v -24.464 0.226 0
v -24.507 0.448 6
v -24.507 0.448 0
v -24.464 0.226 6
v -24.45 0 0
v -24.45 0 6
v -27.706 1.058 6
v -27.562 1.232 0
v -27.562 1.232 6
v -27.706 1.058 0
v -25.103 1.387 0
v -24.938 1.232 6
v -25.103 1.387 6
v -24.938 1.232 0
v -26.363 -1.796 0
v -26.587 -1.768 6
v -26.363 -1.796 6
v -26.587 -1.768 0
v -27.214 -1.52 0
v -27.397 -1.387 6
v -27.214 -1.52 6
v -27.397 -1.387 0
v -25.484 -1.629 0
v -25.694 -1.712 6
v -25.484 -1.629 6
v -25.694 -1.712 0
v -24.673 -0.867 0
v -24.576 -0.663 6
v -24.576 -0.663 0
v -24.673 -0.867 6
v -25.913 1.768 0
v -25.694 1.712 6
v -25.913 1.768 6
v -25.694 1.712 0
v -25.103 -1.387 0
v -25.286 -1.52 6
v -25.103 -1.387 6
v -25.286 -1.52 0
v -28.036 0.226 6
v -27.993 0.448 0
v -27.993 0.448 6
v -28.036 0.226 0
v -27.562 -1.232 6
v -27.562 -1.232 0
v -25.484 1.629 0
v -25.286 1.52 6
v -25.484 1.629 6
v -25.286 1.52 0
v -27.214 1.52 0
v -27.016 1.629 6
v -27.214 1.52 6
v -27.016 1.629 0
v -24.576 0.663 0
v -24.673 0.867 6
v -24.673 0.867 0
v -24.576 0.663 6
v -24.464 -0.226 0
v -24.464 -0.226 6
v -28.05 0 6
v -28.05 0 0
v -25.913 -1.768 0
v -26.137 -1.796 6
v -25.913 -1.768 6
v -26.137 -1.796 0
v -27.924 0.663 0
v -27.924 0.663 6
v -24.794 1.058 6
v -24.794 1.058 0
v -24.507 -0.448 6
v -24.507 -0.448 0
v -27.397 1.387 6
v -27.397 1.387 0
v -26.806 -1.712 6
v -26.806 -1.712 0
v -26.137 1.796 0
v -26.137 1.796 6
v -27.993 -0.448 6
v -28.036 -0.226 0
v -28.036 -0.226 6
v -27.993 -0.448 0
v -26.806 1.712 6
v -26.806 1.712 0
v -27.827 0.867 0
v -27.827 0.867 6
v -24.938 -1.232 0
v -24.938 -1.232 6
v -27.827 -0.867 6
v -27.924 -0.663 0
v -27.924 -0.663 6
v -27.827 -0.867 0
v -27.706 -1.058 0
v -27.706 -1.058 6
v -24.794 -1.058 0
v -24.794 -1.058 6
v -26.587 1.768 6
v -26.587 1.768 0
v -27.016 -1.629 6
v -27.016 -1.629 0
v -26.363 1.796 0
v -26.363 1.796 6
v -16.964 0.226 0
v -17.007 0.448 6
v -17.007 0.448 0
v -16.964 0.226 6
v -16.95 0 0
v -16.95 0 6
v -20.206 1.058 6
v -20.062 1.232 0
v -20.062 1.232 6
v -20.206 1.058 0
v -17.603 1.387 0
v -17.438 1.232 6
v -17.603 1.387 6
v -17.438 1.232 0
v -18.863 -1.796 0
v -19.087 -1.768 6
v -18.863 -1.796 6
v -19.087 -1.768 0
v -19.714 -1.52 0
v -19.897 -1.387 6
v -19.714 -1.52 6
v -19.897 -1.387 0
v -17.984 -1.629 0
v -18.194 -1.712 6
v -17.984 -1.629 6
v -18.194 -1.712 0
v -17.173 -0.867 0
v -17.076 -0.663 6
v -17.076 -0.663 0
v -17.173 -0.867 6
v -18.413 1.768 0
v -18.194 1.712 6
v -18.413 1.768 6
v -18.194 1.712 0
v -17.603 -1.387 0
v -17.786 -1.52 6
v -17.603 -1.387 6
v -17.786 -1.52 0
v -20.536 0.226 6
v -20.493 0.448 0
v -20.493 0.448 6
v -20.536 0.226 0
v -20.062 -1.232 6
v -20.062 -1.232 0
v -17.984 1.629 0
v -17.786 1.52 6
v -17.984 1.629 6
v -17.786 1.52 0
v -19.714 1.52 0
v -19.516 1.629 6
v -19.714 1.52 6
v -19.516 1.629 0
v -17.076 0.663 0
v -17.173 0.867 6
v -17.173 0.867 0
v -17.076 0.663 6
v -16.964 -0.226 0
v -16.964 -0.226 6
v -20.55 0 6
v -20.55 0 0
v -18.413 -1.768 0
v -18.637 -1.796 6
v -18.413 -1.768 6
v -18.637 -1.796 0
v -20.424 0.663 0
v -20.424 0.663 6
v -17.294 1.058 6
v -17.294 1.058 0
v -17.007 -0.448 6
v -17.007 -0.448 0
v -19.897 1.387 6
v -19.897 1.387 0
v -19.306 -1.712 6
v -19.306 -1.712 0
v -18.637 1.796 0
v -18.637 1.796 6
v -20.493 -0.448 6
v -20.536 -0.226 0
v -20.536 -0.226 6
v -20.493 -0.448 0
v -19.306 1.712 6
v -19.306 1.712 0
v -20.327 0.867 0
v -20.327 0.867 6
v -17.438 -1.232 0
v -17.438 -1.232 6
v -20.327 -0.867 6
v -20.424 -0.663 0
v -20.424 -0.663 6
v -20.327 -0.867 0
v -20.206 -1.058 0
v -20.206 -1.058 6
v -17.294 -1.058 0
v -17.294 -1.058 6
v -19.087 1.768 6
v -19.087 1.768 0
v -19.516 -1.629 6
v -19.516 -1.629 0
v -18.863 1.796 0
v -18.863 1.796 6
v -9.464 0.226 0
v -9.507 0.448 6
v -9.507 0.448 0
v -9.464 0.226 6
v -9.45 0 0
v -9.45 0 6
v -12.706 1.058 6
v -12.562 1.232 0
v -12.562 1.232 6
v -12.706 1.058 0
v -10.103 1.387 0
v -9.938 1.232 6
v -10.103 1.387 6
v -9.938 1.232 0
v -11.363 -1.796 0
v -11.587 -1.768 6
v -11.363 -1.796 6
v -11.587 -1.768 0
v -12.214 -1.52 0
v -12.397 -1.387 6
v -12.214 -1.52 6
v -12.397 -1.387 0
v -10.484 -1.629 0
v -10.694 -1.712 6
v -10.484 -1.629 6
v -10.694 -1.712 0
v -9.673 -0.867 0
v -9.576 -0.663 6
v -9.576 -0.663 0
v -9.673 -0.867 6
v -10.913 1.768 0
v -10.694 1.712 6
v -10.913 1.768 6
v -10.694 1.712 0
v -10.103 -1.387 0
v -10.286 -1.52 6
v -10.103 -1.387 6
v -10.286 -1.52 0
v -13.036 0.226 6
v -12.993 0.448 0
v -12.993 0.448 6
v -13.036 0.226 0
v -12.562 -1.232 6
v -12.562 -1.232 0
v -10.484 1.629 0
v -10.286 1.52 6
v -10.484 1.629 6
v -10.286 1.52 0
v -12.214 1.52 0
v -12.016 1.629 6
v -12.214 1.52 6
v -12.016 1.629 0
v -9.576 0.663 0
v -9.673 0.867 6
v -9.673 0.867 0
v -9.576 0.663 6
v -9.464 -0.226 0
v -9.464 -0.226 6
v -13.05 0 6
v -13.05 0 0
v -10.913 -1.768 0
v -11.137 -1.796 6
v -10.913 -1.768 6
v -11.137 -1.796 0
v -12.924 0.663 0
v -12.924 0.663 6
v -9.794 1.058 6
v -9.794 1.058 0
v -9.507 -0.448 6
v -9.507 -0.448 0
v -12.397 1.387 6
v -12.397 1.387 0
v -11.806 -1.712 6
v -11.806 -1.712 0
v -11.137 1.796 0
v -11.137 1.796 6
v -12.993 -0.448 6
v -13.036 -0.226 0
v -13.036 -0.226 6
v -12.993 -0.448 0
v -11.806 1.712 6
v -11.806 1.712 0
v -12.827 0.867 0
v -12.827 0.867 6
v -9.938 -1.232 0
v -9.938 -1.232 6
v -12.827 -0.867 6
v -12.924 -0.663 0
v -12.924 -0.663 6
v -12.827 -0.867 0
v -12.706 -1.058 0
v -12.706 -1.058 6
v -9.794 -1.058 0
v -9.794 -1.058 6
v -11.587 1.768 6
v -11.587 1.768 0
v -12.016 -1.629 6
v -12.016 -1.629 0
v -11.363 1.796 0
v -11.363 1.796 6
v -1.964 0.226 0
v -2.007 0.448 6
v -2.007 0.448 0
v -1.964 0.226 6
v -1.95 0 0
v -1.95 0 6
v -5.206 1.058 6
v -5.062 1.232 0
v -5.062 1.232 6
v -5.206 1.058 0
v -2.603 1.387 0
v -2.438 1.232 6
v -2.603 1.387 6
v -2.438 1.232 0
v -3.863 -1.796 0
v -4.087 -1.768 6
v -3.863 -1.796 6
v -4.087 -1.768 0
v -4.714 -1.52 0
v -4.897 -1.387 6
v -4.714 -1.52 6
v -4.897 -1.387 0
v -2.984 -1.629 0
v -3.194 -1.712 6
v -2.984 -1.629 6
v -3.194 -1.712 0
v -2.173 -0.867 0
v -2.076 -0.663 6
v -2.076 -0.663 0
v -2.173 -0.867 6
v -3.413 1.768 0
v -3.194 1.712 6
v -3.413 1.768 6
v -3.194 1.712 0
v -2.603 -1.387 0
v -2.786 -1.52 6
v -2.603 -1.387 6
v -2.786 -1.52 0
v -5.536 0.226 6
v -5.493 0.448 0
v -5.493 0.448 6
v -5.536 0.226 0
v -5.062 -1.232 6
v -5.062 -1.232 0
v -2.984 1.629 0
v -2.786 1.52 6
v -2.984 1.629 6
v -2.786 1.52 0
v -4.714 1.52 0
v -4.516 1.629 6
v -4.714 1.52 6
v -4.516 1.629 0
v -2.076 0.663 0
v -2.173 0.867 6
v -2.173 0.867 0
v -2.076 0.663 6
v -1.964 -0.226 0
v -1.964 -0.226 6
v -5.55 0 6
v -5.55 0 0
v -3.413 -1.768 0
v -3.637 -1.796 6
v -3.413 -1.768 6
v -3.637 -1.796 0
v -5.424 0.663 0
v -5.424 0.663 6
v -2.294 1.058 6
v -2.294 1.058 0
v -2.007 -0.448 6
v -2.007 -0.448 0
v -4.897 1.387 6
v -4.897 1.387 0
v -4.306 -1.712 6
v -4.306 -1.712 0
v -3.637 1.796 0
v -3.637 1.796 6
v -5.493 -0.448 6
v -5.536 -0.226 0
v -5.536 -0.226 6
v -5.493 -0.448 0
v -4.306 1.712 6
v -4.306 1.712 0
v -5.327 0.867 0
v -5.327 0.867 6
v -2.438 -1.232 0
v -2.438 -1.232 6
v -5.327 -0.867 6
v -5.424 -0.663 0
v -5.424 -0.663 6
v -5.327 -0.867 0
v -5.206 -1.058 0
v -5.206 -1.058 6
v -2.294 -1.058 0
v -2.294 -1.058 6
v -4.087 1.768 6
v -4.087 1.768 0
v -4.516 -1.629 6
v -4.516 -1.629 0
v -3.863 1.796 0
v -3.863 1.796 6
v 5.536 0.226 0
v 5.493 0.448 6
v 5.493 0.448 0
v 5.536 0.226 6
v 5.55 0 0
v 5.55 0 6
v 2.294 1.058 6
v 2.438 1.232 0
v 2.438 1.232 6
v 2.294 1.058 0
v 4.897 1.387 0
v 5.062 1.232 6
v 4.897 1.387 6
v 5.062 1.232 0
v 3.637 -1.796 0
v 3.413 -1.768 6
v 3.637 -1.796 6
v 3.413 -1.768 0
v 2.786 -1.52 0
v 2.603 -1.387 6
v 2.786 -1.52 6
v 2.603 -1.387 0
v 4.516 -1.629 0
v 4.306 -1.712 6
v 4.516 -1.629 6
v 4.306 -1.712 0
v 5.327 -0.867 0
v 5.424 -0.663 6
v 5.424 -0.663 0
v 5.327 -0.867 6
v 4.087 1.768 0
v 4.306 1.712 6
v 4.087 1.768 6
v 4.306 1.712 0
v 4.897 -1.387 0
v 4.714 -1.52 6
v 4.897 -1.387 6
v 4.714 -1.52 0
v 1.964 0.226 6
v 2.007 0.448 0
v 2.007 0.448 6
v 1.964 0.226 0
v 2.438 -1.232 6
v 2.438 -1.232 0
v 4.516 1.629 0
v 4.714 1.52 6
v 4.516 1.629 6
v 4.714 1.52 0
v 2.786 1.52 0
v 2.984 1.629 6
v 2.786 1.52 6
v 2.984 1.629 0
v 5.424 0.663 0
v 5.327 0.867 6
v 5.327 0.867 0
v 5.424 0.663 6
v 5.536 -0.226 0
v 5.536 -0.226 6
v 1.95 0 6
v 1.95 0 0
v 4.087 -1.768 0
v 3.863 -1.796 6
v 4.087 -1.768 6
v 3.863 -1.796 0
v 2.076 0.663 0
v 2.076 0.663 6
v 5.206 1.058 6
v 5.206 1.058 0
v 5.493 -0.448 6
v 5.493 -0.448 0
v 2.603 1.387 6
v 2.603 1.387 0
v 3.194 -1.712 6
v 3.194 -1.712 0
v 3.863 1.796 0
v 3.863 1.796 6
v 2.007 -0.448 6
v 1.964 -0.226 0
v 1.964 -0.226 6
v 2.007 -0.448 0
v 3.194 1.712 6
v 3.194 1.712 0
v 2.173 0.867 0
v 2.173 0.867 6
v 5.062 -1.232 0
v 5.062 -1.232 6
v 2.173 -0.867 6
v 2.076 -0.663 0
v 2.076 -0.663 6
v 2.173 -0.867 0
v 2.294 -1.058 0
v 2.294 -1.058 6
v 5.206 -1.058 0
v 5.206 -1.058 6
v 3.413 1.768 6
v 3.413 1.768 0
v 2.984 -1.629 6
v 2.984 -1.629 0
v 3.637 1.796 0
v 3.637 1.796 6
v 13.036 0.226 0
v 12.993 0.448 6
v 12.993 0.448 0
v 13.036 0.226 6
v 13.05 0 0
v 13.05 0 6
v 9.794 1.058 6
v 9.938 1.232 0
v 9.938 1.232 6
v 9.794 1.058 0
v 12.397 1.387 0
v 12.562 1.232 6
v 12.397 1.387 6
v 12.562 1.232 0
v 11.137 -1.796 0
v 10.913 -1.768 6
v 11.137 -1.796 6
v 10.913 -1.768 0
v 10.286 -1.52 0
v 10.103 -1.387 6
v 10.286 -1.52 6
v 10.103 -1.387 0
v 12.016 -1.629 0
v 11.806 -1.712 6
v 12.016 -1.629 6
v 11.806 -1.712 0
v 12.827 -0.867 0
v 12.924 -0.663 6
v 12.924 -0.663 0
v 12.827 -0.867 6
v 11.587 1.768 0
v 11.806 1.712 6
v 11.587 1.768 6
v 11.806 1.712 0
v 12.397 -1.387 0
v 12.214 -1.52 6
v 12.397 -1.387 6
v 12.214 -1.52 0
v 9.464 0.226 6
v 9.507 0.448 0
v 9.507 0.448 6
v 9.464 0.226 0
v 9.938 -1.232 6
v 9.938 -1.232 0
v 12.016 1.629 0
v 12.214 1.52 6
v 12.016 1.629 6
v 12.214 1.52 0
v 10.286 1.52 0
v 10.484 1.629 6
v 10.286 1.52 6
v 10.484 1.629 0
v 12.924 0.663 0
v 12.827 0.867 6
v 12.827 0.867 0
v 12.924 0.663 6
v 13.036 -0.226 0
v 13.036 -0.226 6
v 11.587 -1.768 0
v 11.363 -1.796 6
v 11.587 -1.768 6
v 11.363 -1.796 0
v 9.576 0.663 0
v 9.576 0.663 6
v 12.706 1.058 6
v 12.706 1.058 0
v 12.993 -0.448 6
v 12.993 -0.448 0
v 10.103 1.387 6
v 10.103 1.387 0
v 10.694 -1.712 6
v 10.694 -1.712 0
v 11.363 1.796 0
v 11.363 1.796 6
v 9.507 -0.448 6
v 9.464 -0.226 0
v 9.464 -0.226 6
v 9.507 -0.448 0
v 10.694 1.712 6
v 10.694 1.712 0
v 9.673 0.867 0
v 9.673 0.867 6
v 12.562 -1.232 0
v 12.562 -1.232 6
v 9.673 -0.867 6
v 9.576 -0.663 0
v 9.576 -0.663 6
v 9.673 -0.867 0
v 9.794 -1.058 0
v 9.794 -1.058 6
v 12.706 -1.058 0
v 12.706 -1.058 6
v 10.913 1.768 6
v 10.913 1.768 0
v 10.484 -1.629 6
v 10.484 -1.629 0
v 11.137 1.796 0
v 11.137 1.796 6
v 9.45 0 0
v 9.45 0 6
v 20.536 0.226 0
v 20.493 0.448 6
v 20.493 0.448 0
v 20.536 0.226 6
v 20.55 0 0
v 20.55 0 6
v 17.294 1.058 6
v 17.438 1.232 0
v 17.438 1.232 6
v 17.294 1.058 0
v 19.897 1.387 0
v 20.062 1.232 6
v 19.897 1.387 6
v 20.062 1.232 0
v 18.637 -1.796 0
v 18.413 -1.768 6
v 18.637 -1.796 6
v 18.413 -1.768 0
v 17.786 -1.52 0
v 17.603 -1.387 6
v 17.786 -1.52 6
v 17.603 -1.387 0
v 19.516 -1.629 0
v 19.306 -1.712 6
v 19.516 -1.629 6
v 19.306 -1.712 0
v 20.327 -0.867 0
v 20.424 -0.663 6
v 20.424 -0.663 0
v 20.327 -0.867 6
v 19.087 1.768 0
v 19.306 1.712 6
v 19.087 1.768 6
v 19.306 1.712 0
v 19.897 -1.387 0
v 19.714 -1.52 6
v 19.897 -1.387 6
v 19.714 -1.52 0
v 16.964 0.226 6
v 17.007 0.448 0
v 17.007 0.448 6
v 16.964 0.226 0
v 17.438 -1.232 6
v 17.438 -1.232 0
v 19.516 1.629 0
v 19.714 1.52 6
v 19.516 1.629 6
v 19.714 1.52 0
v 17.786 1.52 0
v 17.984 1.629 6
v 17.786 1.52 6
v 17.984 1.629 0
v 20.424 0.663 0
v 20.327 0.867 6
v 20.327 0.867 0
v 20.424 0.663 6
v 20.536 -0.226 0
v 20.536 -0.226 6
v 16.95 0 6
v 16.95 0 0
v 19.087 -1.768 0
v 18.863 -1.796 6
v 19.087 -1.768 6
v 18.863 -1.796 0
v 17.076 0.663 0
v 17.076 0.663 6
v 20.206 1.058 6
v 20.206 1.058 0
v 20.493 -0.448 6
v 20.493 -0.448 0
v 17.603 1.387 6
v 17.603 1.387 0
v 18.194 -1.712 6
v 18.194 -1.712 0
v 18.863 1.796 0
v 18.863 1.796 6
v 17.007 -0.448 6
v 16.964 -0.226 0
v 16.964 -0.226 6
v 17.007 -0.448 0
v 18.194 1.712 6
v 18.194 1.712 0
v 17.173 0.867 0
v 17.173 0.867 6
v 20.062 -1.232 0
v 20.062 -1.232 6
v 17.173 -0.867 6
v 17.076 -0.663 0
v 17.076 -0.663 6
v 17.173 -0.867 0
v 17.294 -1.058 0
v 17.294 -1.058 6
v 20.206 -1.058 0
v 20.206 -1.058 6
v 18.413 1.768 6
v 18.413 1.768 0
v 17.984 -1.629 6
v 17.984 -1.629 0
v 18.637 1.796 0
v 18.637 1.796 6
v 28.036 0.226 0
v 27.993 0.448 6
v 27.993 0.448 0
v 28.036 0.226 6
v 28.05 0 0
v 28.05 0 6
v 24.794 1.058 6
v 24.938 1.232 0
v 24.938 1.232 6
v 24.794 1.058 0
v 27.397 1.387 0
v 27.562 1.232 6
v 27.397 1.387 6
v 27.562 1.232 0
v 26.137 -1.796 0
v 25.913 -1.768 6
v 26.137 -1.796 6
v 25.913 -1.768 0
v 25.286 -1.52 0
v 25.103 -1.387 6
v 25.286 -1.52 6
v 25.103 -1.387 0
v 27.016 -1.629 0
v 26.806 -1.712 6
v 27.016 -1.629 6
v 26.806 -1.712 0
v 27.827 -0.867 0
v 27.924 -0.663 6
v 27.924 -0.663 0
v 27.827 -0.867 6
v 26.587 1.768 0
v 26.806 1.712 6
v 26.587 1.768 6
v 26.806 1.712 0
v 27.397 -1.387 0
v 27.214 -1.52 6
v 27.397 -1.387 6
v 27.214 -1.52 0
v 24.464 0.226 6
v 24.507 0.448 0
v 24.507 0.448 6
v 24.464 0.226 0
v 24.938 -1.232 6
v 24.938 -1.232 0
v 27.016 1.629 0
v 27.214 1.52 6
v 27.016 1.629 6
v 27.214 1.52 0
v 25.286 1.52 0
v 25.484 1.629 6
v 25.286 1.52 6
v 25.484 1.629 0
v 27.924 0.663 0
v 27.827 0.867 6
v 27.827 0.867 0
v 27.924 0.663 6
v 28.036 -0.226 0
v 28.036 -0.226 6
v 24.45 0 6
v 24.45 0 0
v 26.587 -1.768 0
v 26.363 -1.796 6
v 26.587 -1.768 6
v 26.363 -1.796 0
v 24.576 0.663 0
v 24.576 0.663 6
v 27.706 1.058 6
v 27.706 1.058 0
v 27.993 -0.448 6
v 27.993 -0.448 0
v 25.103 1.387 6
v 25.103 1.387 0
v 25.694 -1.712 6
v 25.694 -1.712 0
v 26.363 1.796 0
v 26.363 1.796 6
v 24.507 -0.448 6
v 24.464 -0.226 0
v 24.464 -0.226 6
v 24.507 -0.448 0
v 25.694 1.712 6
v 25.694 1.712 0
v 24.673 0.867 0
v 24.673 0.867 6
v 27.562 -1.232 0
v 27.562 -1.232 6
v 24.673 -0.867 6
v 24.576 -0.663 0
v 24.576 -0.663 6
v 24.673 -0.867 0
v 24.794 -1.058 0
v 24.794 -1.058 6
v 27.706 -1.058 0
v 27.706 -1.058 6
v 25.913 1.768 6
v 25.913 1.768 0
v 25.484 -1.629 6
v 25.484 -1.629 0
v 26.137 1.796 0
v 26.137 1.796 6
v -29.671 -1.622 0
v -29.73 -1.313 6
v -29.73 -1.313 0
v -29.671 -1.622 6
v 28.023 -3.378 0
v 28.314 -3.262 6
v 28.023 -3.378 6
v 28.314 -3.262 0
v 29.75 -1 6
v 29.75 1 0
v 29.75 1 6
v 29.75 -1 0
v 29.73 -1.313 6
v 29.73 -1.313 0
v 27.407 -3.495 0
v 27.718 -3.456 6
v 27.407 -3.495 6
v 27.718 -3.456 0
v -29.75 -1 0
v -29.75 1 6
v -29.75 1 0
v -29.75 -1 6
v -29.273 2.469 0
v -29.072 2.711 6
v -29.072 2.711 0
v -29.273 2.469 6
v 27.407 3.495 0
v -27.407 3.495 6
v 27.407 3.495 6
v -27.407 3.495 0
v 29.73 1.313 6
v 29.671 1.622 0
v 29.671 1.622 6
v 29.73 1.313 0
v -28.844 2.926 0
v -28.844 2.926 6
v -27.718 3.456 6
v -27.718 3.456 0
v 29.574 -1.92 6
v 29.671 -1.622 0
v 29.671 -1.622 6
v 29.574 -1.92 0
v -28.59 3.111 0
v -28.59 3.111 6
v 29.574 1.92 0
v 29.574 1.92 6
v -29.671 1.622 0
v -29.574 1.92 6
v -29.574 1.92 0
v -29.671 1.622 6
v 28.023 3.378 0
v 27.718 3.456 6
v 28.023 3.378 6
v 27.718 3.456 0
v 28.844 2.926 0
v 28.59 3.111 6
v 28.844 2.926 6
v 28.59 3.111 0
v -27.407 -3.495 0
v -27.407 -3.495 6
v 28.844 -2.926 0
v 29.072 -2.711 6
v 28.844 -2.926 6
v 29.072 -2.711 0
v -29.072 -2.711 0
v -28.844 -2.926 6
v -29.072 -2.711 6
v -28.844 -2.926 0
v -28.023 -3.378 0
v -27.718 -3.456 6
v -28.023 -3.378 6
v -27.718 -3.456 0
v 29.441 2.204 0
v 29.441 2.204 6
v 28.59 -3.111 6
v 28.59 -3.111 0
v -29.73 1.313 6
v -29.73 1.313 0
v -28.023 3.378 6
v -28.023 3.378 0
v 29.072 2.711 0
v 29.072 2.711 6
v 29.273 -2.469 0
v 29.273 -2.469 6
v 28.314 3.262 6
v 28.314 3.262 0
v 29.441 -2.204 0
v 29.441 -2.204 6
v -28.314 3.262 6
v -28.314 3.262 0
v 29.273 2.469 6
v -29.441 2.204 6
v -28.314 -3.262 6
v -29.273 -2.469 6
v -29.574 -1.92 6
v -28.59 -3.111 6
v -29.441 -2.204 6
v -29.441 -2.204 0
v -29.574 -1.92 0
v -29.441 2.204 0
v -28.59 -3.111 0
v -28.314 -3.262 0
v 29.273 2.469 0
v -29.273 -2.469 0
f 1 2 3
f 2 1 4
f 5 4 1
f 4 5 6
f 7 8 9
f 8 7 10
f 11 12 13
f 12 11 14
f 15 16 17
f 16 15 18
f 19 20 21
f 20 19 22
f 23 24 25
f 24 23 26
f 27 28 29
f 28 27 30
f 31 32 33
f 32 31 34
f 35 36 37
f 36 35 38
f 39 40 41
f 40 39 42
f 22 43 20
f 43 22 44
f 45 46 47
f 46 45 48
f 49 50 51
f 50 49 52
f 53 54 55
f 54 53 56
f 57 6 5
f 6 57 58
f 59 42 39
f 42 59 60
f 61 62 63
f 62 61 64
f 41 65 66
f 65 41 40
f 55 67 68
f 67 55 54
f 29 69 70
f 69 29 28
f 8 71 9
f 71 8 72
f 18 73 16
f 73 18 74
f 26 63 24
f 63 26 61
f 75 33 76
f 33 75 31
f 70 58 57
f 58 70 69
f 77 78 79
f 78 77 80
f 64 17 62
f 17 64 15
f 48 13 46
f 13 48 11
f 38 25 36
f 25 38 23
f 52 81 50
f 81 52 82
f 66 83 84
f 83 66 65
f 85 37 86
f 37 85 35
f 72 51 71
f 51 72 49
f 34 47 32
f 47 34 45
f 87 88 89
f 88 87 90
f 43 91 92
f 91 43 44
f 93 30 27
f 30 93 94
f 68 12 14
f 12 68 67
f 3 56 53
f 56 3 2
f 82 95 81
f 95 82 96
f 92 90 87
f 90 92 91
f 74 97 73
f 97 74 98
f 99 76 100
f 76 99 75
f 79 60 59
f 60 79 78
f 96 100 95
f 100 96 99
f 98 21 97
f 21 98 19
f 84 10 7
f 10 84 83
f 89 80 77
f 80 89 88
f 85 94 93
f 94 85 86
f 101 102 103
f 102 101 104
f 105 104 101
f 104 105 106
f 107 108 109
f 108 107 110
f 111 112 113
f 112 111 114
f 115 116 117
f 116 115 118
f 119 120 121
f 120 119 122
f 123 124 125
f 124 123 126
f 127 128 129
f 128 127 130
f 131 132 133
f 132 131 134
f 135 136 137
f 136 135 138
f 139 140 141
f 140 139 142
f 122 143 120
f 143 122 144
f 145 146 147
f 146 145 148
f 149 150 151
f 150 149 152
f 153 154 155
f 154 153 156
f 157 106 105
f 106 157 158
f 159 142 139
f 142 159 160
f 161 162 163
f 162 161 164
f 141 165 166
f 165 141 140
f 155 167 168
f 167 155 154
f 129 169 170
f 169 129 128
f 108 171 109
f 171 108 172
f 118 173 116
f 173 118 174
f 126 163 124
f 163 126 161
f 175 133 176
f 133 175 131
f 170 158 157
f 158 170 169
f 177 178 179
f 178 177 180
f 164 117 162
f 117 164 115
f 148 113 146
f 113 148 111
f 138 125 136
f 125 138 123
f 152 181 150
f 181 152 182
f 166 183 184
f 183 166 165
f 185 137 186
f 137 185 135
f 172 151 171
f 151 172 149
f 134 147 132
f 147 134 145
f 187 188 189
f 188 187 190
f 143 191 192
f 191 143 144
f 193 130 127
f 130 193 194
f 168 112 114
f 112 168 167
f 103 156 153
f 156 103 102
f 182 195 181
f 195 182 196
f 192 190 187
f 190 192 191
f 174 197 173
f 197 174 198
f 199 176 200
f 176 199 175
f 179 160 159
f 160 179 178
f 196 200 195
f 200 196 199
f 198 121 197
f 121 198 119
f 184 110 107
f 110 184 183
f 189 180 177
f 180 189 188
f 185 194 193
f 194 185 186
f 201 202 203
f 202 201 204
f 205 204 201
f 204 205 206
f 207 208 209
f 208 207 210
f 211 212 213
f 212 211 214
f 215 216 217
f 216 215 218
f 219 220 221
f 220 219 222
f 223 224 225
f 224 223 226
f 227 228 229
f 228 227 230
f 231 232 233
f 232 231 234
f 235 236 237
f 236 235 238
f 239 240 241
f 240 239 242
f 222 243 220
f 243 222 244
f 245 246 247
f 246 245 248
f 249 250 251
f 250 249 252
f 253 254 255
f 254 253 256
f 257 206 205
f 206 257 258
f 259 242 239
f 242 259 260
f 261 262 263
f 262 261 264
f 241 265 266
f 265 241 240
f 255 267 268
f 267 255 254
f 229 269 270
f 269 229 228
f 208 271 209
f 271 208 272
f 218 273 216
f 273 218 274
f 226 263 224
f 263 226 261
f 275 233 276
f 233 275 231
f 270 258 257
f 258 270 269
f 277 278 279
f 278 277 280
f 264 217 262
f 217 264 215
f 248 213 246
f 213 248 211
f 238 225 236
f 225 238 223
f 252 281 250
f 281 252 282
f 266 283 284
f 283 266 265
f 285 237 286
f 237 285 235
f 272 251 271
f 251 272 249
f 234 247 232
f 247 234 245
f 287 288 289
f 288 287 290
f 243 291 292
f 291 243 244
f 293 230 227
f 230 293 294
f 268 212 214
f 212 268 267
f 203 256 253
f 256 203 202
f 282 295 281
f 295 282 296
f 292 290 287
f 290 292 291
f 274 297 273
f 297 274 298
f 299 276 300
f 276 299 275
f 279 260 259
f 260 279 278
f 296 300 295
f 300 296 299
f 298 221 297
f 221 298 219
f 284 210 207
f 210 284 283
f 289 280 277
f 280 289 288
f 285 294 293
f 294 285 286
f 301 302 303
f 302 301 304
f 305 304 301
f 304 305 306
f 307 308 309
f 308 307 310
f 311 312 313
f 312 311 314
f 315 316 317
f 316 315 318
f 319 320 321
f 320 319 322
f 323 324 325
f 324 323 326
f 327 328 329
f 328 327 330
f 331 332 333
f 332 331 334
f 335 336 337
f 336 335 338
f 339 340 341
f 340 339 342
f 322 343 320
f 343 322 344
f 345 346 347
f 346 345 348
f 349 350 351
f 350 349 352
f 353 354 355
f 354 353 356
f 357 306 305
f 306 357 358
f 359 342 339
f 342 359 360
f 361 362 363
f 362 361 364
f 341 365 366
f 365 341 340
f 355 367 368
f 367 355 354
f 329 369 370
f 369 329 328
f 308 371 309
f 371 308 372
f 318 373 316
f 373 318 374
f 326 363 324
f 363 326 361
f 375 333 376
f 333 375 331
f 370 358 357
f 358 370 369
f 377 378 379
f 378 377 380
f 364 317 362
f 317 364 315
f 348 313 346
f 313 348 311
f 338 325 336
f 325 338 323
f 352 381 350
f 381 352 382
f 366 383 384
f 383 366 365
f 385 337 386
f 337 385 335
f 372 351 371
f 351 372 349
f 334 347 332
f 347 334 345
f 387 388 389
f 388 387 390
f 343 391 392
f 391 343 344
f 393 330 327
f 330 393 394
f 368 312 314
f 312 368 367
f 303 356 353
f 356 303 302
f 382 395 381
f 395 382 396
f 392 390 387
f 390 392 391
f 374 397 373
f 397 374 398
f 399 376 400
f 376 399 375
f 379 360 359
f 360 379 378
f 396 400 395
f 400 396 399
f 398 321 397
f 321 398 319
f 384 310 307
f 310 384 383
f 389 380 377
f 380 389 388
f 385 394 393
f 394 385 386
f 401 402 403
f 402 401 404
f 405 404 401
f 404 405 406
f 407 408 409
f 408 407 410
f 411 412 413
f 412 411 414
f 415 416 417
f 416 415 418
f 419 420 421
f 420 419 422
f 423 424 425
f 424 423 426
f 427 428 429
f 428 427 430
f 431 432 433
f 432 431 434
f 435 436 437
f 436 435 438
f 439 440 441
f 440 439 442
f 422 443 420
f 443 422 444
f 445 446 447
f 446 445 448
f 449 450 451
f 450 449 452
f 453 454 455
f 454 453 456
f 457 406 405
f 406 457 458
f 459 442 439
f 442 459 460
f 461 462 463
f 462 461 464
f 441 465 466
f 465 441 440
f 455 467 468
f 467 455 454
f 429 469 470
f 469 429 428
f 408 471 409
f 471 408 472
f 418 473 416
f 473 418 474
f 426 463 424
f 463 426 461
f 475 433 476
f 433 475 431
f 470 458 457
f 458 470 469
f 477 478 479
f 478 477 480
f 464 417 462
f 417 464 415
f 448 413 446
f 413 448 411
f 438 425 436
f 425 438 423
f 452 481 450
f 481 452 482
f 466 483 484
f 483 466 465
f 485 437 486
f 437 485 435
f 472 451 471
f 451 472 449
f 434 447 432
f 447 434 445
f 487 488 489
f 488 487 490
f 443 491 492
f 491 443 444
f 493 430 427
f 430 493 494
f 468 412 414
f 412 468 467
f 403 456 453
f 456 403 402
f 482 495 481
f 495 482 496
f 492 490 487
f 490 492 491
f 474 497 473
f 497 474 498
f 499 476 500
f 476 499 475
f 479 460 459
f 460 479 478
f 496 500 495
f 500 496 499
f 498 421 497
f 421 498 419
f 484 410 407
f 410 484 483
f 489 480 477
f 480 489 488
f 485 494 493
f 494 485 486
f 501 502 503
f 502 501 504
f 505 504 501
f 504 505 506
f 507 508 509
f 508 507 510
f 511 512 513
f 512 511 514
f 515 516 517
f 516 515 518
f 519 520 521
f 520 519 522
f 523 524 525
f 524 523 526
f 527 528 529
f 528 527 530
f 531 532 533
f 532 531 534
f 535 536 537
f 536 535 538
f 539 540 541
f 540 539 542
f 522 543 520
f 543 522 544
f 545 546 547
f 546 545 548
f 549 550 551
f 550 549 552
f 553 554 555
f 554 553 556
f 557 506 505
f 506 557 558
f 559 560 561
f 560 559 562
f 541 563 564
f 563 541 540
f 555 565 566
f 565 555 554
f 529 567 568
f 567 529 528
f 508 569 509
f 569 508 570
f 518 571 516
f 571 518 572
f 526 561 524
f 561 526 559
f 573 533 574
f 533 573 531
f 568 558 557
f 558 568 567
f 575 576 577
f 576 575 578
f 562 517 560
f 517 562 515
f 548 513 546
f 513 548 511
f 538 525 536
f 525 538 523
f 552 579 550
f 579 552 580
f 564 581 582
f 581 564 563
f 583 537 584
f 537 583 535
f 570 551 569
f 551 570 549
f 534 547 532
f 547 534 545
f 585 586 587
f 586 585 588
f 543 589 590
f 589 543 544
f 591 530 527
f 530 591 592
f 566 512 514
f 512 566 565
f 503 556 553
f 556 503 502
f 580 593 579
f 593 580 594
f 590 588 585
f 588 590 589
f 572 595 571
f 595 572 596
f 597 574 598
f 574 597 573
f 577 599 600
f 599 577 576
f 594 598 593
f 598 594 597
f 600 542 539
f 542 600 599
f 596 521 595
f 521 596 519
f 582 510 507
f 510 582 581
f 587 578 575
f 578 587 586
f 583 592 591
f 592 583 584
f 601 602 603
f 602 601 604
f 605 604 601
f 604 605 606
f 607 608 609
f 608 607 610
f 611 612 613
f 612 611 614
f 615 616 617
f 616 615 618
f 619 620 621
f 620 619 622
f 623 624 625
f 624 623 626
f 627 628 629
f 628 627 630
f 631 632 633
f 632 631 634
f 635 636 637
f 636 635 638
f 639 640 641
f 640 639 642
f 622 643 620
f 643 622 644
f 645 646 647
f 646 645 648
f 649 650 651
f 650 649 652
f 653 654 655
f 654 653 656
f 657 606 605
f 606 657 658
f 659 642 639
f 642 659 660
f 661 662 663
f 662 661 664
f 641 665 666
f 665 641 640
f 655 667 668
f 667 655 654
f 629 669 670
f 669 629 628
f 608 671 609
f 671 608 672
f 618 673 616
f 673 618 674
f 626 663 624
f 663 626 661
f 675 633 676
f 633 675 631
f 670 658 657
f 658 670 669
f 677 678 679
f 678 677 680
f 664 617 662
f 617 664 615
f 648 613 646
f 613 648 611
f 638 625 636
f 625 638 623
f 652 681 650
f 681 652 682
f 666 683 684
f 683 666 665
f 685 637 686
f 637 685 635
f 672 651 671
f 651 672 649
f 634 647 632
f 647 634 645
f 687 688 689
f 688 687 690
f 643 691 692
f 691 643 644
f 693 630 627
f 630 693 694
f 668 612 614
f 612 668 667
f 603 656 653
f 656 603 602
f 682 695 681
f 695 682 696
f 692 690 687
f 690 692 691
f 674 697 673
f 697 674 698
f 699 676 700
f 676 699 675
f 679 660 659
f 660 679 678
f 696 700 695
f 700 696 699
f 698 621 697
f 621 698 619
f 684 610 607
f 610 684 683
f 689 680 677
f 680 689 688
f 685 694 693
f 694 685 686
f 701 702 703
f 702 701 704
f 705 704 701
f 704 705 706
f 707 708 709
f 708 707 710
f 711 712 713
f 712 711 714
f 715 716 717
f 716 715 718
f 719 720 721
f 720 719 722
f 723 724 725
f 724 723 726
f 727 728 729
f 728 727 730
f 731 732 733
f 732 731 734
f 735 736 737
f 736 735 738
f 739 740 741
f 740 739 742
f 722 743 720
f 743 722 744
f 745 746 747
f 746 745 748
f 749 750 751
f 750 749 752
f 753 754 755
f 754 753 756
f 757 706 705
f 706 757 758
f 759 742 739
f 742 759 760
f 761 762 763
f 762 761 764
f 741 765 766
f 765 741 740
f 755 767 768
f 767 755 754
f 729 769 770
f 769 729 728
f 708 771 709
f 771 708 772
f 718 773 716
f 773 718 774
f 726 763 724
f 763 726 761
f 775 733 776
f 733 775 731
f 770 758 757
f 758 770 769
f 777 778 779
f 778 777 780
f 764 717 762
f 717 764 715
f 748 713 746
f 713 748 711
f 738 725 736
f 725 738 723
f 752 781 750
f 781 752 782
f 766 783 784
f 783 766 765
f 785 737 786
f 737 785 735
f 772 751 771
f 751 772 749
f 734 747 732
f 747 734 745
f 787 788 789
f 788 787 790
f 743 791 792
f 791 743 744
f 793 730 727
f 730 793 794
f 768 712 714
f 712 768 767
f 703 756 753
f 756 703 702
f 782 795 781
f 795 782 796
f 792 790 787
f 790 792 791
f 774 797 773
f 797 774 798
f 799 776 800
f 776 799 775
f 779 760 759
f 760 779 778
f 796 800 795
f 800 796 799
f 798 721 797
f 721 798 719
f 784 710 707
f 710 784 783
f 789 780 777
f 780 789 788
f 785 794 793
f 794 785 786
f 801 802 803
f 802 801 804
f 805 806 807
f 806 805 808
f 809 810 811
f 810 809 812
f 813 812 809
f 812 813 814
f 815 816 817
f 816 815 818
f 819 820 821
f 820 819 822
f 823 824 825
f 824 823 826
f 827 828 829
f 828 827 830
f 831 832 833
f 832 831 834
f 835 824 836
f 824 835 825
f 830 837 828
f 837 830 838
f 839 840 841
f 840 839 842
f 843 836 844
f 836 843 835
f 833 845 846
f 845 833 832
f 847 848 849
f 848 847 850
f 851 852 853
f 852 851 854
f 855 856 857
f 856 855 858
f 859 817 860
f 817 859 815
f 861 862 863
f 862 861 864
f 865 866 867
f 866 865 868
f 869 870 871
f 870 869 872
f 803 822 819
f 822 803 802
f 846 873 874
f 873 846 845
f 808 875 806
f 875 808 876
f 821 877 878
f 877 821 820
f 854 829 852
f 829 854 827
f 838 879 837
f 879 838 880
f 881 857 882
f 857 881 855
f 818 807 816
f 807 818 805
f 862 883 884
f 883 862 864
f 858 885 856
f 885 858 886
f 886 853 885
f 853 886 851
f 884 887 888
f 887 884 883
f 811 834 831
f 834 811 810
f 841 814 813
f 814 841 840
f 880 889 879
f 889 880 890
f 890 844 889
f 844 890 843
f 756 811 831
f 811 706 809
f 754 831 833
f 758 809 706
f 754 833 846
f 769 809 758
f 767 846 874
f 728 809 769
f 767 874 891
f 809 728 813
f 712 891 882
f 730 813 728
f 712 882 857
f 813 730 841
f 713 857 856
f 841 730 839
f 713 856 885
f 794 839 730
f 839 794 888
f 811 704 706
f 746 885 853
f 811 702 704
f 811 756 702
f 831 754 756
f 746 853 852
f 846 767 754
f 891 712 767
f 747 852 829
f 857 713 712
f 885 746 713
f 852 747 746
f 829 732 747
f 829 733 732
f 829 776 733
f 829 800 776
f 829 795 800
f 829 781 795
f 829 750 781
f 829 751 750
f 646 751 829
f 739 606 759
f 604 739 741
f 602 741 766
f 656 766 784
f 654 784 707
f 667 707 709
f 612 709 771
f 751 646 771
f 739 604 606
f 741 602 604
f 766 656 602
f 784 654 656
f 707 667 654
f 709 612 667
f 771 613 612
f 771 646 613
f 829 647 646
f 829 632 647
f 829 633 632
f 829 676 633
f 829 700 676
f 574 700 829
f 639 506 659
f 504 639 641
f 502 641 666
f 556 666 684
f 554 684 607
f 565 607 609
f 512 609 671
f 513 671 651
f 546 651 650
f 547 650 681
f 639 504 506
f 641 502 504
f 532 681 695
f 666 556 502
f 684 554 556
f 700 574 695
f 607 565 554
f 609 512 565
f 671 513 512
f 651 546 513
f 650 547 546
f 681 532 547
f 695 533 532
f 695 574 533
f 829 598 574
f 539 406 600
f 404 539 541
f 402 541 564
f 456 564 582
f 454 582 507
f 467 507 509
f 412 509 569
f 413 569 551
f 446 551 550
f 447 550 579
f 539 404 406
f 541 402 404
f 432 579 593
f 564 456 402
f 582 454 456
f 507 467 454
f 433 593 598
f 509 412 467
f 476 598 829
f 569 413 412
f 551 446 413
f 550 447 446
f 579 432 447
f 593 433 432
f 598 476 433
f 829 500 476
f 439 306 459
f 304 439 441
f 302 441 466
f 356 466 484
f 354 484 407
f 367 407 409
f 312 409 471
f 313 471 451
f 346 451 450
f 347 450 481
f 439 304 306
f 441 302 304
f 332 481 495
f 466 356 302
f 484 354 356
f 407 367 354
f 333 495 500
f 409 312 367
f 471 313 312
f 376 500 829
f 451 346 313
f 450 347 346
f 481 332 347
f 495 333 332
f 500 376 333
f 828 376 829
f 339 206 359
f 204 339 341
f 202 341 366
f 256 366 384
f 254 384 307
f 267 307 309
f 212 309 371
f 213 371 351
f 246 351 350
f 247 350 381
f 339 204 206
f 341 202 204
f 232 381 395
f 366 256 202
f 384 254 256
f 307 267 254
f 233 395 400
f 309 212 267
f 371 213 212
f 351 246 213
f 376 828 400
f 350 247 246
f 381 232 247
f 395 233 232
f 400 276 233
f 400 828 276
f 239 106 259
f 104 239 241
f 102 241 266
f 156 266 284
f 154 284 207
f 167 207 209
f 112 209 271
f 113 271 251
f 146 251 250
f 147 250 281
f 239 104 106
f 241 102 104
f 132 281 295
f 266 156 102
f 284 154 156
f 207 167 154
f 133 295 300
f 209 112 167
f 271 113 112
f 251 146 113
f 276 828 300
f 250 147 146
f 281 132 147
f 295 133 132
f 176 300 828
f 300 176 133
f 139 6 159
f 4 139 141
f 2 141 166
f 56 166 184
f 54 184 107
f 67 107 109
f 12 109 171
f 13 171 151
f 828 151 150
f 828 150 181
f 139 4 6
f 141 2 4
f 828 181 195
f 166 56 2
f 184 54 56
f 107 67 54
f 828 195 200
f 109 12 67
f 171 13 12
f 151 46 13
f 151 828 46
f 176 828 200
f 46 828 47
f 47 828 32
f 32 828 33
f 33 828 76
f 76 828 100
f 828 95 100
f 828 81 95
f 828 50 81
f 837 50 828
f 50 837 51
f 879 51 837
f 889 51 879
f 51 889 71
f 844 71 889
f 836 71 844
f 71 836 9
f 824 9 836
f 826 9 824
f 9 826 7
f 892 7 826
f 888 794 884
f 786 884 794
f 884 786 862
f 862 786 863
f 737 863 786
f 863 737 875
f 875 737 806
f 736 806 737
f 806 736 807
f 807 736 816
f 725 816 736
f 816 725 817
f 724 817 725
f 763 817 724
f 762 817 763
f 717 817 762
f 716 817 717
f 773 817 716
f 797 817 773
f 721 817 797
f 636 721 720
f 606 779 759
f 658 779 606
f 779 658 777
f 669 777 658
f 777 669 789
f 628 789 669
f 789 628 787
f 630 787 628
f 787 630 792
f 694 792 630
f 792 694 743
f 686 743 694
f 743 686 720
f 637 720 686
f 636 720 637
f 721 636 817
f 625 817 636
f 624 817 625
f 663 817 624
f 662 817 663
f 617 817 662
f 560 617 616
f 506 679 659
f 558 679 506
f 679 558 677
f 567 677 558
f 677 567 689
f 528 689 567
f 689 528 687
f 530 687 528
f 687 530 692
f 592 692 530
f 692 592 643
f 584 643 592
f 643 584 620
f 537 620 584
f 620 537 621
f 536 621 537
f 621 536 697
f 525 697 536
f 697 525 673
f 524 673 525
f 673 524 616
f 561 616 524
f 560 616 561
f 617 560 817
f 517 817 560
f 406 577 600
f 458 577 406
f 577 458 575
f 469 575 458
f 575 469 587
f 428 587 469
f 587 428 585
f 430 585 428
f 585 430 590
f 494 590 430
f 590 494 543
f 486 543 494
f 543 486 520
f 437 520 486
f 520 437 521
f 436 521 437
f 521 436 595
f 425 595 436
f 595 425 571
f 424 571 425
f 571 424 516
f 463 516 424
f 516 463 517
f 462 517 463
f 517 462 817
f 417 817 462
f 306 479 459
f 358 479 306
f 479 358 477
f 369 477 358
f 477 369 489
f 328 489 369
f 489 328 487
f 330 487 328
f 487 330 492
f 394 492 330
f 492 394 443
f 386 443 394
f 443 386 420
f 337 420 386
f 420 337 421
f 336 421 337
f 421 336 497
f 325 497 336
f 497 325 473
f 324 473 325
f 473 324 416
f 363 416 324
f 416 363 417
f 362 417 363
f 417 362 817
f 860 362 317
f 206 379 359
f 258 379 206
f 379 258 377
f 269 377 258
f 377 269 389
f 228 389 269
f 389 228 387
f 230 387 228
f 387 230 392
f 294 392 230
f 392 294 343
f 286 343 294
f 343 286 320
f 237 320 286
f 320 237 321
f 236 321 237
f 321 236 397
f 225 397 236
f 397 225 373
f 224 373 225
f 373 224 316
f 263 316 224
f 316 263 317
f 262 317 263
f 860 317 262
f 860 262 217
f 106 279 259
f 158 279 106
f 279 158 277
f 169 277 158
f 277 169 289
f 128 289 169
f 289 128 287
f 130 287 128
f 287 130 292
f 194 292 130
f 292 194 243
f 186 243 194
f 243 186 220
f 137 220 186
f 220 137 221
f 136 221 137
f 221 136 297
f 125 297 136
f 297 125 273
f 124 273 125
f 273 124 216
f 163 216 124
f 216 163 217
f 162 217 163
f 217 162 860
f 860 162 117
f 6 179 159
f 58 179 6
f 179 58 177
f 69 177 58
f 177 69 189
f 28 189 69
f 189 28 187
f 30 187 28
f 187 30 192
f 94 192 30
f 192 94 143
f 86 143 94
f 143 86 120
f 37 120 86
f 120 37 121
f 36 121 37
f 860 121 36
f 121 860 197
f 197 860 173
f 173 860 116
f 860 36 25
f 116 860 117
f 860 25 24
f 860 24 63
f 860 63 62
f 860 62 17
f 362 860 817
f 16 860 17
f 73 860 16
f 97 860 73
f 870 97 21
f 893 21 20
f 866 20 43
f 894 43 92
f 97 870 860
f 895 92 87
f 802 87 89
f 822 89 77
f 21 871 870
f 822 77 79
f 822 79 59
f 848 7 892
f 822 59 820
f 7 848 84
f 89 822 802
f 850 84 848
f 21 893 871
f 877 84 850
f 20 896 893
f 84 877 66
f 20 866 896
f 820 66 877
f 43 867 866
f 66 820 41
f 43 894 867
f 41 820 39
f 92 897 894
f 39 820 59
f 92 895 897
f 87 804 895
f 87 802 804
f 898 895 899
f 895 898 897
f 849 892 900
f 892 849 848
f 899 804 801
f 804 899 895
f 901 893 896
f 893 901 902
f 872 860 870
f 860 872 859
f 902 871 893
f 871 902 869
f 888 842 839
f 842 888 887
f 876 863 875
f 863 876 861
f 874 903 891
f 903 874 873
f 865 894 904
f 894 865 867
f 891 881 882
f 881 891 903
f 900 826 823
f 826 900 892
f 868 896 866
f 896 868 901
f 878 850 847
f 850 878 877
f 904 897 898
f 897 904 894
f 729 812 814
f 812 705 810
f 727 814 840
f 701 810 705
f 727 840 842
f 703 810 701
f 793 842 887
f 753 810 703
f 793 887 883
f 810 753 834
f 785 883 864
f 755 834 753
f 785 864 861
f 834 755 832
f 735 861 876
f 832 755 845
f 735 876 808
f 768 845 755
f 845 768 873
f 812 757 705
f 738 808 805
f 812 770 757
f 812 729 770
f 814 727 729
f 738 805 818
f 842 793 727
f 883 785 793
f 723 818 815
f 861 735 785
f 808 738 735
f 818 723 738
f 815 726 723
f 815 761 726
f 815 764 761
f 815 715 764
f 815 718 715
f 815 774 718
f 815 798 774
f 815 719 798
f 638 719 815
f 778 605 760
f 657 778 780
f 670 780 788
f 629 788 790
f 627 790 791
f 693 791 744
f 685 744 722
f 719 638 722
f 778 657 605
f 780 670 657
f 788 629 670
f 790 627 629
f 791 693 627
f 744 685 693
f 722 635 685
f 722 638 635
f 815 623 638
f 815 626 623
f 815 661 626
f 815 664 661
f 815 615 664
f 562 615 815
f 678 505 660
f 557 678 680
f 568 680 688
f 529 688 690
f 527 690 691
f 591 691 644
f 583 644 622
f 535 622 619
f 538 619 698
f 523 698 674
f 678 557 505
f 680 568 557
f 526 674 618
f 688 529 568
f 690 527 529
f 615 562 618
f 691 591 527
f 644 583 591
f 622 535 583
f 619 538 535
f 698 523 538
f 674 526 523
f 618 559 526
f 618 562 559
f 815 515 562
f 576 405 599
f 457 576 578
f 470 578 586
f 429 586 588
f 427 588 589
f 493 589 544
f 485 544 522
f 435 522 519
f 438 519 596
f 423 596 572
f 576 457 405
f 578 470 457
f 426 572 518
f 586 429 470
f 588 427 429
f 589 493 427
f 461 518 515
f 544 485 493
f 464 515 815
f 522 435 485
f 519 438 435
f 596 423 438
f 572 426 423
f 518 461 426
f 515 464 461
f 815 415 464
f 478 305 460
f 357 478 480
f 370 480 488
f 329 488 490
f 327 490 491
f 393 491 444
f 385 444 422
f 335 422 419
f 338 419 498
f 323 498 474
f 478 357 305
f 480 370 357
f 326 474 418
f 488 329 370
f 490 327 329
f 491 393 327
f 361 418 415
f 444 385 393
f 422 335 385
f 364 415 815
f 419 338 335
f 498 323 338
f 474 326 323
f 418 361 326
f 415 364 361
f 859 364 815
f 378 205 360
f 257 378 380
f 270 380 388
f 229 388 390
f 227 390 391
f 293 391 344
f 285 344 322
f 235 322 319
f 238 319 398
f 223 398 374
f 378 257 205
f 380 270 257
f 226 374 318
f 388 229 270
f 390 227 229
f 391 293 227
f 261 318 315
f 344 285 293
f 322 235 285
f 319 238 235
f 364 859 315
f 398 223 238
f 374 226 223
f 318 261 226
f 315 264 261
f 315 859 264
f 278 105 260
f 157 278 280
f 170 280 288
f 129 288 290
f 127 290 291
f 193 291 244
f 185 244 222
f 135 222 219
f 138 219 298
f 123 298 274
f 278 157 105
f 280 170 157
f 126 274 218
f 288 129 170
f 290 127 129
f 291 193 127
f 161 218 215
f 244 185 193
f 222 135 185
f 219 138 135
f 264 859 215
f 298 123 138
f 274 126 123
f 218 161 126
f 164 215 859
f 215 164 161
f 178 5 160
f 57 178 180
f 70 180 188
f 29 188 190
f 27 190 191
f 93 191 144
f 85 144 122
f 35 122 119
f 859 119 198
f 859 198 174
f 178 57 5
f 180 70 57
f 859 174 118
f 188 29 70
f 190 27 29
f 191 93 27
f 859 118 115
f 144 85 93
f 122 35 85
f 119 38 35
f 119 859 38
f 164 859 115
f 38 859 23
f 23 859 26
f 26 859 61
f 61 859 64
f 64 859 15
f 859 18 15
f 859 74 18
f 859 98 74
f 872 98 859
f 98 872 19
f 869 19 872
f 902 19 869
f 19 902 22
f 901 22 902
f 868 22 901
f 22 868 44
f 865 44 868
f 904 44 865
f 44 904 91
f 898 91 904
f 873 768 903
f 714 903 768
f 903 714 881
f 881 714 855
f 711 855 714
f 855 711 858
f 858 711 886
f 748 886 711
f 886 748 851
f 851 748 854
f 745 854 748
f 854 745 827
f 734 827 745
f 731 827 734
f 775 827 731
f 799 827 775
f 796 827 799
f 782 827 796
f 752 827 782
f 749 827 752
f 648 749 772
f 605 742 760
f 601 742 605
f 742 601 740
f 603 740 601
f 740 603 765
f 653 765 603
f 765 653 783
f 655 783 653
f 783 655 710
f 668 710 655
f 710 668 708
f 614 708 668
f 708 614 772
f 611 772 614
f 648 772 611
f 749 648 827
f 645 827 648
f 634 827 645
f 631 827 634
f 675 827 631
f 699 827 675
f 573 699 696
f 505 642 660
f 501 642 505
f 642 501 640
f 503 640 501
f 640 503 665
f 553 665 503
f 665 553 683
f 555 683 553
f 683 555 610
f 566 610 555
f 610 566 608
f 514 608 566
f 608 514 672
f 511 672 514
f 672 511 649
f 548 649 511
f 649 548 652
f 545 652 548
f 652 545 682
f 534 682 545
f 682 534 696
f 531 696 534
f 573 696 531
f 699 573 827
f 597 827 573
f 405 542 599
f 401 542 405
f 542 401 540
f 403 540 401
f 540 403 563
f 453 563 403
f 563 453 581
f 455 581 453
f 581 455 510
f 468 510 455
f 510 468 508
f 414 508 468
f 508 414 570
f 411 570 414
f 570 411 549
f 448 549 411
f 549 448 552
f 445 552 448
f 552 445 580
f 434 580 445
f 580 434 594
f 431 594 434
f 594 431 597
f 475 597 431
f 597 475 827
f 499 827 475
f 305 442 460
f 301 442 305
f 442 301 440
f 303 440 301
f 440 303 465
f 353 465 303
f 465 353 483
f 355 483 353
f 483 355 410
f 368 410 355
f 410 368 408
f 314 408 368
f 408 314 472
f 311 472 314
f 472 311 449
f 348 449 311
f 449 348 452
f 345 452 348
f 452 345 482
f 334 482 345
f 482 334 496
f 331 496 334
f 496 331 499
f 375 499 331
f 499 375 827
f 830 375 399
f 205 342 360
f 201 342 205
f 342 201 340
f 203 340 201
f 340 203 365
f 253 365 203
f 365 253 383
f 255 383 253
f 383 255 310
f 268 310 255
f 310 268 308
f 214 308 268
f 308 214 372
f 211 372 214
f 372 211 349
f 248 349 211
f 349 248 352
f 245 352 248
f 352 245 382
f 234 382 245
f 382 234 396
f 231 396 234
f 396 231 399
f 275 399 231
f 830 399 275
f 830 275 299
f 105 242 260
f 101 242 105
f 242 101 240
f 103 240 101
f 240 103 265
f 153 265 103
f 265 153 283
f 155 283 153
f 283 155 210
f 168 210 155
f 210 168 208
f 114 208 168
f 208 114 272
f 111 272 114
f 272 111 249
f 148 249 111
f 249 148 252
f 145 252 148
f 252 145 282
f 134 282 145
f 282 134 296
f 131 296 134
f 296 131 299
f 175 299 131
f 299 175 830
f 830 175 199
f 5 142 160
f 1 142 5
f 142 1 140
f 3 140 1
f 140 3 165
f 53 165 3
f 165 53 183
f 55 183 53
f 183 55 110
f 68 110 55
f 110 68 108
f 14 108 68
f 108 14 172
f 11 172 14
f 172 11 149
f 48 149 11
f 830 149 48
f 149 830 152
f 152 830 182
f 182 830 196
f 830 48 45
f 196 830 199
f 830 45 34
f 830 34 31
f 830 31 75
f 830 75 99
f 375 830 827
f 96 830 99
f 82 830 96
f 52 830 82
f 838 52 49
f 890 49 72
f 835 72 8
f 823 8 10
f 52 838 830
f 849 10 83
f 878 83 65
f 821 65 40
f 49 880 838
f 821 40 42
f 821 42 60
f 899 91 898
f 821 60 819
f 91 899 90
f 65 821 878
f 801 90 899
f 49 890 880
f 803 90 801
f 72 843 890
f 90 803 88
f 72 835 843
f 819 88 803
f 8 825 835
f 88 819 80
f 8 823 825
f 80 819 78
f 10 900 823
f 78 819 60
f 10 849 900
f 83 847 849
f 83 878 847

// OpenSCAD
$fn = 50;


difference() {
	union() {
		translate(v = [0, 0, 0]) {
			rotate(a = [0, 0, 0]) {
				hull() {
					translate(v = [-27.2500000000, 1.0000000000, 0]) {
						rotate(a = [0, 0, 0]) {
							translate(v = [0, 0, 0]) {
								rotate(a = [0, 0, 0]) {
									cylinder(h = 6, r = 2.5000000000);
								}
							}
						}
					}
					translate(v = [27.2500000000, 1.0000000000, 0]) {
						rotate(a = [0, 0, 0]) {
							translate(v = [0, 0, 0]) {
								rotate(a = [0, 0, 0]) {
									cylinder(h = 6, r = 2.5000000000);
								}
							}
						}
					}
					translate(v = [-27.2500000000, -1.0000000000, 0]) {
						rotate(a = [0, 0, 0]) {
							translate(v = [0, 0, 0]) {
								rotate(a = [0, 0, 0]) {
									cylinder(h = 6, r = 2.5000000000);
								}
							}
						}
					}
					translate(v = [27.2500000000, -1.0000000000, 0]) {
						rotate(a = [0, 0, 0]) {
							translate(v = [0, 0, 0]) {
								rotate(a = [0, 0, 0]) {
									cylinder(h = 6, r = 2.5000000000);
								}
							}
						}
					}
				}
			}
		}
	}
	union() {
		translate(v = [-26.2500000000, 0.0000000000, 0]) {
			rotate(a = [0, 0, 0]) {
				translate(v = [0, 0, -50]) {
					rotate(a = [0, 0, 0]) {
						cylinder(h = 100, r = 1.8000000000);
					}
				}
			}
		}
		translate(v = [-18.7500000000, 0.0000000000, 0]) {
			rotate(a = [0, 0, 0]) {
				translate(v = [0, 0, -50]) {
					rotate(a = [0, 0, 0]) {
						cylinder(h = 100, r = 1.8000000000);
					}
				}
			}
		}
		translate(v = [-11.2500000000, 0.0000000000, 0]) {
			rotate(a = [0, 0, 0]) {
				translate(v = [0, 0, -50]) {
					rotate(a = [0, 0, 0]) {
						cylinder(h = 100, r = 1.8000000000);
					}
				}
			}
		}
		translate(v = [-3.7500000000, 0.0000000000, 0]) {
			rotate(a = [0, 0, 0]) {
				translate(v = [0, 0, -50]) {
					rotate(a = [0, 0, 0]) {
						cylinder(h = 100, r = 1.8000000000);
					}
				}
			}
		}
		translate(v = [3.7500000000, 0.0000000000, 0]) {
			rotate(a = [0, 0, 0]) {
				translate(v = [0, 0, -50]) {
					rotate(a = [0, 0, 0]) {
						cylinder(h = 100, r = 1.8000000000);
					}
				}
			}
		}
		translate(v = [11.2500000000, 0.0000000000, 0]) {
			rotate(a = [0, 0, 0]) {
				translate(v = [0, 0, -50]) {
					rotate(a = [0, 0, 0]) {
						cylinder(h = 100, r = 1.8000000000);
					}
				}
			}
		}
		translate(v = [18.7500000000, 0.0000000000, 0]) {
			rotate(a = [0, 0, 0]) {
				translate(v = [0, 0, -50]) {
					rotate(a = [0, 0, 0]) {
						cylinder(h = 100, r = 1.8000000000);
					}
				}
			}
		}
		translate(v = [26.2500000000, 0.0000000000, 0]) {
			rotate(a = [0, 0, 0]) {
				translate(v = [0, 0, -50]) {
					rotate(a = [0, 0, 0]) {
						cylinder(h = 100, r = 1.8000000000);
					}
				}
			}
		}
	}
}
